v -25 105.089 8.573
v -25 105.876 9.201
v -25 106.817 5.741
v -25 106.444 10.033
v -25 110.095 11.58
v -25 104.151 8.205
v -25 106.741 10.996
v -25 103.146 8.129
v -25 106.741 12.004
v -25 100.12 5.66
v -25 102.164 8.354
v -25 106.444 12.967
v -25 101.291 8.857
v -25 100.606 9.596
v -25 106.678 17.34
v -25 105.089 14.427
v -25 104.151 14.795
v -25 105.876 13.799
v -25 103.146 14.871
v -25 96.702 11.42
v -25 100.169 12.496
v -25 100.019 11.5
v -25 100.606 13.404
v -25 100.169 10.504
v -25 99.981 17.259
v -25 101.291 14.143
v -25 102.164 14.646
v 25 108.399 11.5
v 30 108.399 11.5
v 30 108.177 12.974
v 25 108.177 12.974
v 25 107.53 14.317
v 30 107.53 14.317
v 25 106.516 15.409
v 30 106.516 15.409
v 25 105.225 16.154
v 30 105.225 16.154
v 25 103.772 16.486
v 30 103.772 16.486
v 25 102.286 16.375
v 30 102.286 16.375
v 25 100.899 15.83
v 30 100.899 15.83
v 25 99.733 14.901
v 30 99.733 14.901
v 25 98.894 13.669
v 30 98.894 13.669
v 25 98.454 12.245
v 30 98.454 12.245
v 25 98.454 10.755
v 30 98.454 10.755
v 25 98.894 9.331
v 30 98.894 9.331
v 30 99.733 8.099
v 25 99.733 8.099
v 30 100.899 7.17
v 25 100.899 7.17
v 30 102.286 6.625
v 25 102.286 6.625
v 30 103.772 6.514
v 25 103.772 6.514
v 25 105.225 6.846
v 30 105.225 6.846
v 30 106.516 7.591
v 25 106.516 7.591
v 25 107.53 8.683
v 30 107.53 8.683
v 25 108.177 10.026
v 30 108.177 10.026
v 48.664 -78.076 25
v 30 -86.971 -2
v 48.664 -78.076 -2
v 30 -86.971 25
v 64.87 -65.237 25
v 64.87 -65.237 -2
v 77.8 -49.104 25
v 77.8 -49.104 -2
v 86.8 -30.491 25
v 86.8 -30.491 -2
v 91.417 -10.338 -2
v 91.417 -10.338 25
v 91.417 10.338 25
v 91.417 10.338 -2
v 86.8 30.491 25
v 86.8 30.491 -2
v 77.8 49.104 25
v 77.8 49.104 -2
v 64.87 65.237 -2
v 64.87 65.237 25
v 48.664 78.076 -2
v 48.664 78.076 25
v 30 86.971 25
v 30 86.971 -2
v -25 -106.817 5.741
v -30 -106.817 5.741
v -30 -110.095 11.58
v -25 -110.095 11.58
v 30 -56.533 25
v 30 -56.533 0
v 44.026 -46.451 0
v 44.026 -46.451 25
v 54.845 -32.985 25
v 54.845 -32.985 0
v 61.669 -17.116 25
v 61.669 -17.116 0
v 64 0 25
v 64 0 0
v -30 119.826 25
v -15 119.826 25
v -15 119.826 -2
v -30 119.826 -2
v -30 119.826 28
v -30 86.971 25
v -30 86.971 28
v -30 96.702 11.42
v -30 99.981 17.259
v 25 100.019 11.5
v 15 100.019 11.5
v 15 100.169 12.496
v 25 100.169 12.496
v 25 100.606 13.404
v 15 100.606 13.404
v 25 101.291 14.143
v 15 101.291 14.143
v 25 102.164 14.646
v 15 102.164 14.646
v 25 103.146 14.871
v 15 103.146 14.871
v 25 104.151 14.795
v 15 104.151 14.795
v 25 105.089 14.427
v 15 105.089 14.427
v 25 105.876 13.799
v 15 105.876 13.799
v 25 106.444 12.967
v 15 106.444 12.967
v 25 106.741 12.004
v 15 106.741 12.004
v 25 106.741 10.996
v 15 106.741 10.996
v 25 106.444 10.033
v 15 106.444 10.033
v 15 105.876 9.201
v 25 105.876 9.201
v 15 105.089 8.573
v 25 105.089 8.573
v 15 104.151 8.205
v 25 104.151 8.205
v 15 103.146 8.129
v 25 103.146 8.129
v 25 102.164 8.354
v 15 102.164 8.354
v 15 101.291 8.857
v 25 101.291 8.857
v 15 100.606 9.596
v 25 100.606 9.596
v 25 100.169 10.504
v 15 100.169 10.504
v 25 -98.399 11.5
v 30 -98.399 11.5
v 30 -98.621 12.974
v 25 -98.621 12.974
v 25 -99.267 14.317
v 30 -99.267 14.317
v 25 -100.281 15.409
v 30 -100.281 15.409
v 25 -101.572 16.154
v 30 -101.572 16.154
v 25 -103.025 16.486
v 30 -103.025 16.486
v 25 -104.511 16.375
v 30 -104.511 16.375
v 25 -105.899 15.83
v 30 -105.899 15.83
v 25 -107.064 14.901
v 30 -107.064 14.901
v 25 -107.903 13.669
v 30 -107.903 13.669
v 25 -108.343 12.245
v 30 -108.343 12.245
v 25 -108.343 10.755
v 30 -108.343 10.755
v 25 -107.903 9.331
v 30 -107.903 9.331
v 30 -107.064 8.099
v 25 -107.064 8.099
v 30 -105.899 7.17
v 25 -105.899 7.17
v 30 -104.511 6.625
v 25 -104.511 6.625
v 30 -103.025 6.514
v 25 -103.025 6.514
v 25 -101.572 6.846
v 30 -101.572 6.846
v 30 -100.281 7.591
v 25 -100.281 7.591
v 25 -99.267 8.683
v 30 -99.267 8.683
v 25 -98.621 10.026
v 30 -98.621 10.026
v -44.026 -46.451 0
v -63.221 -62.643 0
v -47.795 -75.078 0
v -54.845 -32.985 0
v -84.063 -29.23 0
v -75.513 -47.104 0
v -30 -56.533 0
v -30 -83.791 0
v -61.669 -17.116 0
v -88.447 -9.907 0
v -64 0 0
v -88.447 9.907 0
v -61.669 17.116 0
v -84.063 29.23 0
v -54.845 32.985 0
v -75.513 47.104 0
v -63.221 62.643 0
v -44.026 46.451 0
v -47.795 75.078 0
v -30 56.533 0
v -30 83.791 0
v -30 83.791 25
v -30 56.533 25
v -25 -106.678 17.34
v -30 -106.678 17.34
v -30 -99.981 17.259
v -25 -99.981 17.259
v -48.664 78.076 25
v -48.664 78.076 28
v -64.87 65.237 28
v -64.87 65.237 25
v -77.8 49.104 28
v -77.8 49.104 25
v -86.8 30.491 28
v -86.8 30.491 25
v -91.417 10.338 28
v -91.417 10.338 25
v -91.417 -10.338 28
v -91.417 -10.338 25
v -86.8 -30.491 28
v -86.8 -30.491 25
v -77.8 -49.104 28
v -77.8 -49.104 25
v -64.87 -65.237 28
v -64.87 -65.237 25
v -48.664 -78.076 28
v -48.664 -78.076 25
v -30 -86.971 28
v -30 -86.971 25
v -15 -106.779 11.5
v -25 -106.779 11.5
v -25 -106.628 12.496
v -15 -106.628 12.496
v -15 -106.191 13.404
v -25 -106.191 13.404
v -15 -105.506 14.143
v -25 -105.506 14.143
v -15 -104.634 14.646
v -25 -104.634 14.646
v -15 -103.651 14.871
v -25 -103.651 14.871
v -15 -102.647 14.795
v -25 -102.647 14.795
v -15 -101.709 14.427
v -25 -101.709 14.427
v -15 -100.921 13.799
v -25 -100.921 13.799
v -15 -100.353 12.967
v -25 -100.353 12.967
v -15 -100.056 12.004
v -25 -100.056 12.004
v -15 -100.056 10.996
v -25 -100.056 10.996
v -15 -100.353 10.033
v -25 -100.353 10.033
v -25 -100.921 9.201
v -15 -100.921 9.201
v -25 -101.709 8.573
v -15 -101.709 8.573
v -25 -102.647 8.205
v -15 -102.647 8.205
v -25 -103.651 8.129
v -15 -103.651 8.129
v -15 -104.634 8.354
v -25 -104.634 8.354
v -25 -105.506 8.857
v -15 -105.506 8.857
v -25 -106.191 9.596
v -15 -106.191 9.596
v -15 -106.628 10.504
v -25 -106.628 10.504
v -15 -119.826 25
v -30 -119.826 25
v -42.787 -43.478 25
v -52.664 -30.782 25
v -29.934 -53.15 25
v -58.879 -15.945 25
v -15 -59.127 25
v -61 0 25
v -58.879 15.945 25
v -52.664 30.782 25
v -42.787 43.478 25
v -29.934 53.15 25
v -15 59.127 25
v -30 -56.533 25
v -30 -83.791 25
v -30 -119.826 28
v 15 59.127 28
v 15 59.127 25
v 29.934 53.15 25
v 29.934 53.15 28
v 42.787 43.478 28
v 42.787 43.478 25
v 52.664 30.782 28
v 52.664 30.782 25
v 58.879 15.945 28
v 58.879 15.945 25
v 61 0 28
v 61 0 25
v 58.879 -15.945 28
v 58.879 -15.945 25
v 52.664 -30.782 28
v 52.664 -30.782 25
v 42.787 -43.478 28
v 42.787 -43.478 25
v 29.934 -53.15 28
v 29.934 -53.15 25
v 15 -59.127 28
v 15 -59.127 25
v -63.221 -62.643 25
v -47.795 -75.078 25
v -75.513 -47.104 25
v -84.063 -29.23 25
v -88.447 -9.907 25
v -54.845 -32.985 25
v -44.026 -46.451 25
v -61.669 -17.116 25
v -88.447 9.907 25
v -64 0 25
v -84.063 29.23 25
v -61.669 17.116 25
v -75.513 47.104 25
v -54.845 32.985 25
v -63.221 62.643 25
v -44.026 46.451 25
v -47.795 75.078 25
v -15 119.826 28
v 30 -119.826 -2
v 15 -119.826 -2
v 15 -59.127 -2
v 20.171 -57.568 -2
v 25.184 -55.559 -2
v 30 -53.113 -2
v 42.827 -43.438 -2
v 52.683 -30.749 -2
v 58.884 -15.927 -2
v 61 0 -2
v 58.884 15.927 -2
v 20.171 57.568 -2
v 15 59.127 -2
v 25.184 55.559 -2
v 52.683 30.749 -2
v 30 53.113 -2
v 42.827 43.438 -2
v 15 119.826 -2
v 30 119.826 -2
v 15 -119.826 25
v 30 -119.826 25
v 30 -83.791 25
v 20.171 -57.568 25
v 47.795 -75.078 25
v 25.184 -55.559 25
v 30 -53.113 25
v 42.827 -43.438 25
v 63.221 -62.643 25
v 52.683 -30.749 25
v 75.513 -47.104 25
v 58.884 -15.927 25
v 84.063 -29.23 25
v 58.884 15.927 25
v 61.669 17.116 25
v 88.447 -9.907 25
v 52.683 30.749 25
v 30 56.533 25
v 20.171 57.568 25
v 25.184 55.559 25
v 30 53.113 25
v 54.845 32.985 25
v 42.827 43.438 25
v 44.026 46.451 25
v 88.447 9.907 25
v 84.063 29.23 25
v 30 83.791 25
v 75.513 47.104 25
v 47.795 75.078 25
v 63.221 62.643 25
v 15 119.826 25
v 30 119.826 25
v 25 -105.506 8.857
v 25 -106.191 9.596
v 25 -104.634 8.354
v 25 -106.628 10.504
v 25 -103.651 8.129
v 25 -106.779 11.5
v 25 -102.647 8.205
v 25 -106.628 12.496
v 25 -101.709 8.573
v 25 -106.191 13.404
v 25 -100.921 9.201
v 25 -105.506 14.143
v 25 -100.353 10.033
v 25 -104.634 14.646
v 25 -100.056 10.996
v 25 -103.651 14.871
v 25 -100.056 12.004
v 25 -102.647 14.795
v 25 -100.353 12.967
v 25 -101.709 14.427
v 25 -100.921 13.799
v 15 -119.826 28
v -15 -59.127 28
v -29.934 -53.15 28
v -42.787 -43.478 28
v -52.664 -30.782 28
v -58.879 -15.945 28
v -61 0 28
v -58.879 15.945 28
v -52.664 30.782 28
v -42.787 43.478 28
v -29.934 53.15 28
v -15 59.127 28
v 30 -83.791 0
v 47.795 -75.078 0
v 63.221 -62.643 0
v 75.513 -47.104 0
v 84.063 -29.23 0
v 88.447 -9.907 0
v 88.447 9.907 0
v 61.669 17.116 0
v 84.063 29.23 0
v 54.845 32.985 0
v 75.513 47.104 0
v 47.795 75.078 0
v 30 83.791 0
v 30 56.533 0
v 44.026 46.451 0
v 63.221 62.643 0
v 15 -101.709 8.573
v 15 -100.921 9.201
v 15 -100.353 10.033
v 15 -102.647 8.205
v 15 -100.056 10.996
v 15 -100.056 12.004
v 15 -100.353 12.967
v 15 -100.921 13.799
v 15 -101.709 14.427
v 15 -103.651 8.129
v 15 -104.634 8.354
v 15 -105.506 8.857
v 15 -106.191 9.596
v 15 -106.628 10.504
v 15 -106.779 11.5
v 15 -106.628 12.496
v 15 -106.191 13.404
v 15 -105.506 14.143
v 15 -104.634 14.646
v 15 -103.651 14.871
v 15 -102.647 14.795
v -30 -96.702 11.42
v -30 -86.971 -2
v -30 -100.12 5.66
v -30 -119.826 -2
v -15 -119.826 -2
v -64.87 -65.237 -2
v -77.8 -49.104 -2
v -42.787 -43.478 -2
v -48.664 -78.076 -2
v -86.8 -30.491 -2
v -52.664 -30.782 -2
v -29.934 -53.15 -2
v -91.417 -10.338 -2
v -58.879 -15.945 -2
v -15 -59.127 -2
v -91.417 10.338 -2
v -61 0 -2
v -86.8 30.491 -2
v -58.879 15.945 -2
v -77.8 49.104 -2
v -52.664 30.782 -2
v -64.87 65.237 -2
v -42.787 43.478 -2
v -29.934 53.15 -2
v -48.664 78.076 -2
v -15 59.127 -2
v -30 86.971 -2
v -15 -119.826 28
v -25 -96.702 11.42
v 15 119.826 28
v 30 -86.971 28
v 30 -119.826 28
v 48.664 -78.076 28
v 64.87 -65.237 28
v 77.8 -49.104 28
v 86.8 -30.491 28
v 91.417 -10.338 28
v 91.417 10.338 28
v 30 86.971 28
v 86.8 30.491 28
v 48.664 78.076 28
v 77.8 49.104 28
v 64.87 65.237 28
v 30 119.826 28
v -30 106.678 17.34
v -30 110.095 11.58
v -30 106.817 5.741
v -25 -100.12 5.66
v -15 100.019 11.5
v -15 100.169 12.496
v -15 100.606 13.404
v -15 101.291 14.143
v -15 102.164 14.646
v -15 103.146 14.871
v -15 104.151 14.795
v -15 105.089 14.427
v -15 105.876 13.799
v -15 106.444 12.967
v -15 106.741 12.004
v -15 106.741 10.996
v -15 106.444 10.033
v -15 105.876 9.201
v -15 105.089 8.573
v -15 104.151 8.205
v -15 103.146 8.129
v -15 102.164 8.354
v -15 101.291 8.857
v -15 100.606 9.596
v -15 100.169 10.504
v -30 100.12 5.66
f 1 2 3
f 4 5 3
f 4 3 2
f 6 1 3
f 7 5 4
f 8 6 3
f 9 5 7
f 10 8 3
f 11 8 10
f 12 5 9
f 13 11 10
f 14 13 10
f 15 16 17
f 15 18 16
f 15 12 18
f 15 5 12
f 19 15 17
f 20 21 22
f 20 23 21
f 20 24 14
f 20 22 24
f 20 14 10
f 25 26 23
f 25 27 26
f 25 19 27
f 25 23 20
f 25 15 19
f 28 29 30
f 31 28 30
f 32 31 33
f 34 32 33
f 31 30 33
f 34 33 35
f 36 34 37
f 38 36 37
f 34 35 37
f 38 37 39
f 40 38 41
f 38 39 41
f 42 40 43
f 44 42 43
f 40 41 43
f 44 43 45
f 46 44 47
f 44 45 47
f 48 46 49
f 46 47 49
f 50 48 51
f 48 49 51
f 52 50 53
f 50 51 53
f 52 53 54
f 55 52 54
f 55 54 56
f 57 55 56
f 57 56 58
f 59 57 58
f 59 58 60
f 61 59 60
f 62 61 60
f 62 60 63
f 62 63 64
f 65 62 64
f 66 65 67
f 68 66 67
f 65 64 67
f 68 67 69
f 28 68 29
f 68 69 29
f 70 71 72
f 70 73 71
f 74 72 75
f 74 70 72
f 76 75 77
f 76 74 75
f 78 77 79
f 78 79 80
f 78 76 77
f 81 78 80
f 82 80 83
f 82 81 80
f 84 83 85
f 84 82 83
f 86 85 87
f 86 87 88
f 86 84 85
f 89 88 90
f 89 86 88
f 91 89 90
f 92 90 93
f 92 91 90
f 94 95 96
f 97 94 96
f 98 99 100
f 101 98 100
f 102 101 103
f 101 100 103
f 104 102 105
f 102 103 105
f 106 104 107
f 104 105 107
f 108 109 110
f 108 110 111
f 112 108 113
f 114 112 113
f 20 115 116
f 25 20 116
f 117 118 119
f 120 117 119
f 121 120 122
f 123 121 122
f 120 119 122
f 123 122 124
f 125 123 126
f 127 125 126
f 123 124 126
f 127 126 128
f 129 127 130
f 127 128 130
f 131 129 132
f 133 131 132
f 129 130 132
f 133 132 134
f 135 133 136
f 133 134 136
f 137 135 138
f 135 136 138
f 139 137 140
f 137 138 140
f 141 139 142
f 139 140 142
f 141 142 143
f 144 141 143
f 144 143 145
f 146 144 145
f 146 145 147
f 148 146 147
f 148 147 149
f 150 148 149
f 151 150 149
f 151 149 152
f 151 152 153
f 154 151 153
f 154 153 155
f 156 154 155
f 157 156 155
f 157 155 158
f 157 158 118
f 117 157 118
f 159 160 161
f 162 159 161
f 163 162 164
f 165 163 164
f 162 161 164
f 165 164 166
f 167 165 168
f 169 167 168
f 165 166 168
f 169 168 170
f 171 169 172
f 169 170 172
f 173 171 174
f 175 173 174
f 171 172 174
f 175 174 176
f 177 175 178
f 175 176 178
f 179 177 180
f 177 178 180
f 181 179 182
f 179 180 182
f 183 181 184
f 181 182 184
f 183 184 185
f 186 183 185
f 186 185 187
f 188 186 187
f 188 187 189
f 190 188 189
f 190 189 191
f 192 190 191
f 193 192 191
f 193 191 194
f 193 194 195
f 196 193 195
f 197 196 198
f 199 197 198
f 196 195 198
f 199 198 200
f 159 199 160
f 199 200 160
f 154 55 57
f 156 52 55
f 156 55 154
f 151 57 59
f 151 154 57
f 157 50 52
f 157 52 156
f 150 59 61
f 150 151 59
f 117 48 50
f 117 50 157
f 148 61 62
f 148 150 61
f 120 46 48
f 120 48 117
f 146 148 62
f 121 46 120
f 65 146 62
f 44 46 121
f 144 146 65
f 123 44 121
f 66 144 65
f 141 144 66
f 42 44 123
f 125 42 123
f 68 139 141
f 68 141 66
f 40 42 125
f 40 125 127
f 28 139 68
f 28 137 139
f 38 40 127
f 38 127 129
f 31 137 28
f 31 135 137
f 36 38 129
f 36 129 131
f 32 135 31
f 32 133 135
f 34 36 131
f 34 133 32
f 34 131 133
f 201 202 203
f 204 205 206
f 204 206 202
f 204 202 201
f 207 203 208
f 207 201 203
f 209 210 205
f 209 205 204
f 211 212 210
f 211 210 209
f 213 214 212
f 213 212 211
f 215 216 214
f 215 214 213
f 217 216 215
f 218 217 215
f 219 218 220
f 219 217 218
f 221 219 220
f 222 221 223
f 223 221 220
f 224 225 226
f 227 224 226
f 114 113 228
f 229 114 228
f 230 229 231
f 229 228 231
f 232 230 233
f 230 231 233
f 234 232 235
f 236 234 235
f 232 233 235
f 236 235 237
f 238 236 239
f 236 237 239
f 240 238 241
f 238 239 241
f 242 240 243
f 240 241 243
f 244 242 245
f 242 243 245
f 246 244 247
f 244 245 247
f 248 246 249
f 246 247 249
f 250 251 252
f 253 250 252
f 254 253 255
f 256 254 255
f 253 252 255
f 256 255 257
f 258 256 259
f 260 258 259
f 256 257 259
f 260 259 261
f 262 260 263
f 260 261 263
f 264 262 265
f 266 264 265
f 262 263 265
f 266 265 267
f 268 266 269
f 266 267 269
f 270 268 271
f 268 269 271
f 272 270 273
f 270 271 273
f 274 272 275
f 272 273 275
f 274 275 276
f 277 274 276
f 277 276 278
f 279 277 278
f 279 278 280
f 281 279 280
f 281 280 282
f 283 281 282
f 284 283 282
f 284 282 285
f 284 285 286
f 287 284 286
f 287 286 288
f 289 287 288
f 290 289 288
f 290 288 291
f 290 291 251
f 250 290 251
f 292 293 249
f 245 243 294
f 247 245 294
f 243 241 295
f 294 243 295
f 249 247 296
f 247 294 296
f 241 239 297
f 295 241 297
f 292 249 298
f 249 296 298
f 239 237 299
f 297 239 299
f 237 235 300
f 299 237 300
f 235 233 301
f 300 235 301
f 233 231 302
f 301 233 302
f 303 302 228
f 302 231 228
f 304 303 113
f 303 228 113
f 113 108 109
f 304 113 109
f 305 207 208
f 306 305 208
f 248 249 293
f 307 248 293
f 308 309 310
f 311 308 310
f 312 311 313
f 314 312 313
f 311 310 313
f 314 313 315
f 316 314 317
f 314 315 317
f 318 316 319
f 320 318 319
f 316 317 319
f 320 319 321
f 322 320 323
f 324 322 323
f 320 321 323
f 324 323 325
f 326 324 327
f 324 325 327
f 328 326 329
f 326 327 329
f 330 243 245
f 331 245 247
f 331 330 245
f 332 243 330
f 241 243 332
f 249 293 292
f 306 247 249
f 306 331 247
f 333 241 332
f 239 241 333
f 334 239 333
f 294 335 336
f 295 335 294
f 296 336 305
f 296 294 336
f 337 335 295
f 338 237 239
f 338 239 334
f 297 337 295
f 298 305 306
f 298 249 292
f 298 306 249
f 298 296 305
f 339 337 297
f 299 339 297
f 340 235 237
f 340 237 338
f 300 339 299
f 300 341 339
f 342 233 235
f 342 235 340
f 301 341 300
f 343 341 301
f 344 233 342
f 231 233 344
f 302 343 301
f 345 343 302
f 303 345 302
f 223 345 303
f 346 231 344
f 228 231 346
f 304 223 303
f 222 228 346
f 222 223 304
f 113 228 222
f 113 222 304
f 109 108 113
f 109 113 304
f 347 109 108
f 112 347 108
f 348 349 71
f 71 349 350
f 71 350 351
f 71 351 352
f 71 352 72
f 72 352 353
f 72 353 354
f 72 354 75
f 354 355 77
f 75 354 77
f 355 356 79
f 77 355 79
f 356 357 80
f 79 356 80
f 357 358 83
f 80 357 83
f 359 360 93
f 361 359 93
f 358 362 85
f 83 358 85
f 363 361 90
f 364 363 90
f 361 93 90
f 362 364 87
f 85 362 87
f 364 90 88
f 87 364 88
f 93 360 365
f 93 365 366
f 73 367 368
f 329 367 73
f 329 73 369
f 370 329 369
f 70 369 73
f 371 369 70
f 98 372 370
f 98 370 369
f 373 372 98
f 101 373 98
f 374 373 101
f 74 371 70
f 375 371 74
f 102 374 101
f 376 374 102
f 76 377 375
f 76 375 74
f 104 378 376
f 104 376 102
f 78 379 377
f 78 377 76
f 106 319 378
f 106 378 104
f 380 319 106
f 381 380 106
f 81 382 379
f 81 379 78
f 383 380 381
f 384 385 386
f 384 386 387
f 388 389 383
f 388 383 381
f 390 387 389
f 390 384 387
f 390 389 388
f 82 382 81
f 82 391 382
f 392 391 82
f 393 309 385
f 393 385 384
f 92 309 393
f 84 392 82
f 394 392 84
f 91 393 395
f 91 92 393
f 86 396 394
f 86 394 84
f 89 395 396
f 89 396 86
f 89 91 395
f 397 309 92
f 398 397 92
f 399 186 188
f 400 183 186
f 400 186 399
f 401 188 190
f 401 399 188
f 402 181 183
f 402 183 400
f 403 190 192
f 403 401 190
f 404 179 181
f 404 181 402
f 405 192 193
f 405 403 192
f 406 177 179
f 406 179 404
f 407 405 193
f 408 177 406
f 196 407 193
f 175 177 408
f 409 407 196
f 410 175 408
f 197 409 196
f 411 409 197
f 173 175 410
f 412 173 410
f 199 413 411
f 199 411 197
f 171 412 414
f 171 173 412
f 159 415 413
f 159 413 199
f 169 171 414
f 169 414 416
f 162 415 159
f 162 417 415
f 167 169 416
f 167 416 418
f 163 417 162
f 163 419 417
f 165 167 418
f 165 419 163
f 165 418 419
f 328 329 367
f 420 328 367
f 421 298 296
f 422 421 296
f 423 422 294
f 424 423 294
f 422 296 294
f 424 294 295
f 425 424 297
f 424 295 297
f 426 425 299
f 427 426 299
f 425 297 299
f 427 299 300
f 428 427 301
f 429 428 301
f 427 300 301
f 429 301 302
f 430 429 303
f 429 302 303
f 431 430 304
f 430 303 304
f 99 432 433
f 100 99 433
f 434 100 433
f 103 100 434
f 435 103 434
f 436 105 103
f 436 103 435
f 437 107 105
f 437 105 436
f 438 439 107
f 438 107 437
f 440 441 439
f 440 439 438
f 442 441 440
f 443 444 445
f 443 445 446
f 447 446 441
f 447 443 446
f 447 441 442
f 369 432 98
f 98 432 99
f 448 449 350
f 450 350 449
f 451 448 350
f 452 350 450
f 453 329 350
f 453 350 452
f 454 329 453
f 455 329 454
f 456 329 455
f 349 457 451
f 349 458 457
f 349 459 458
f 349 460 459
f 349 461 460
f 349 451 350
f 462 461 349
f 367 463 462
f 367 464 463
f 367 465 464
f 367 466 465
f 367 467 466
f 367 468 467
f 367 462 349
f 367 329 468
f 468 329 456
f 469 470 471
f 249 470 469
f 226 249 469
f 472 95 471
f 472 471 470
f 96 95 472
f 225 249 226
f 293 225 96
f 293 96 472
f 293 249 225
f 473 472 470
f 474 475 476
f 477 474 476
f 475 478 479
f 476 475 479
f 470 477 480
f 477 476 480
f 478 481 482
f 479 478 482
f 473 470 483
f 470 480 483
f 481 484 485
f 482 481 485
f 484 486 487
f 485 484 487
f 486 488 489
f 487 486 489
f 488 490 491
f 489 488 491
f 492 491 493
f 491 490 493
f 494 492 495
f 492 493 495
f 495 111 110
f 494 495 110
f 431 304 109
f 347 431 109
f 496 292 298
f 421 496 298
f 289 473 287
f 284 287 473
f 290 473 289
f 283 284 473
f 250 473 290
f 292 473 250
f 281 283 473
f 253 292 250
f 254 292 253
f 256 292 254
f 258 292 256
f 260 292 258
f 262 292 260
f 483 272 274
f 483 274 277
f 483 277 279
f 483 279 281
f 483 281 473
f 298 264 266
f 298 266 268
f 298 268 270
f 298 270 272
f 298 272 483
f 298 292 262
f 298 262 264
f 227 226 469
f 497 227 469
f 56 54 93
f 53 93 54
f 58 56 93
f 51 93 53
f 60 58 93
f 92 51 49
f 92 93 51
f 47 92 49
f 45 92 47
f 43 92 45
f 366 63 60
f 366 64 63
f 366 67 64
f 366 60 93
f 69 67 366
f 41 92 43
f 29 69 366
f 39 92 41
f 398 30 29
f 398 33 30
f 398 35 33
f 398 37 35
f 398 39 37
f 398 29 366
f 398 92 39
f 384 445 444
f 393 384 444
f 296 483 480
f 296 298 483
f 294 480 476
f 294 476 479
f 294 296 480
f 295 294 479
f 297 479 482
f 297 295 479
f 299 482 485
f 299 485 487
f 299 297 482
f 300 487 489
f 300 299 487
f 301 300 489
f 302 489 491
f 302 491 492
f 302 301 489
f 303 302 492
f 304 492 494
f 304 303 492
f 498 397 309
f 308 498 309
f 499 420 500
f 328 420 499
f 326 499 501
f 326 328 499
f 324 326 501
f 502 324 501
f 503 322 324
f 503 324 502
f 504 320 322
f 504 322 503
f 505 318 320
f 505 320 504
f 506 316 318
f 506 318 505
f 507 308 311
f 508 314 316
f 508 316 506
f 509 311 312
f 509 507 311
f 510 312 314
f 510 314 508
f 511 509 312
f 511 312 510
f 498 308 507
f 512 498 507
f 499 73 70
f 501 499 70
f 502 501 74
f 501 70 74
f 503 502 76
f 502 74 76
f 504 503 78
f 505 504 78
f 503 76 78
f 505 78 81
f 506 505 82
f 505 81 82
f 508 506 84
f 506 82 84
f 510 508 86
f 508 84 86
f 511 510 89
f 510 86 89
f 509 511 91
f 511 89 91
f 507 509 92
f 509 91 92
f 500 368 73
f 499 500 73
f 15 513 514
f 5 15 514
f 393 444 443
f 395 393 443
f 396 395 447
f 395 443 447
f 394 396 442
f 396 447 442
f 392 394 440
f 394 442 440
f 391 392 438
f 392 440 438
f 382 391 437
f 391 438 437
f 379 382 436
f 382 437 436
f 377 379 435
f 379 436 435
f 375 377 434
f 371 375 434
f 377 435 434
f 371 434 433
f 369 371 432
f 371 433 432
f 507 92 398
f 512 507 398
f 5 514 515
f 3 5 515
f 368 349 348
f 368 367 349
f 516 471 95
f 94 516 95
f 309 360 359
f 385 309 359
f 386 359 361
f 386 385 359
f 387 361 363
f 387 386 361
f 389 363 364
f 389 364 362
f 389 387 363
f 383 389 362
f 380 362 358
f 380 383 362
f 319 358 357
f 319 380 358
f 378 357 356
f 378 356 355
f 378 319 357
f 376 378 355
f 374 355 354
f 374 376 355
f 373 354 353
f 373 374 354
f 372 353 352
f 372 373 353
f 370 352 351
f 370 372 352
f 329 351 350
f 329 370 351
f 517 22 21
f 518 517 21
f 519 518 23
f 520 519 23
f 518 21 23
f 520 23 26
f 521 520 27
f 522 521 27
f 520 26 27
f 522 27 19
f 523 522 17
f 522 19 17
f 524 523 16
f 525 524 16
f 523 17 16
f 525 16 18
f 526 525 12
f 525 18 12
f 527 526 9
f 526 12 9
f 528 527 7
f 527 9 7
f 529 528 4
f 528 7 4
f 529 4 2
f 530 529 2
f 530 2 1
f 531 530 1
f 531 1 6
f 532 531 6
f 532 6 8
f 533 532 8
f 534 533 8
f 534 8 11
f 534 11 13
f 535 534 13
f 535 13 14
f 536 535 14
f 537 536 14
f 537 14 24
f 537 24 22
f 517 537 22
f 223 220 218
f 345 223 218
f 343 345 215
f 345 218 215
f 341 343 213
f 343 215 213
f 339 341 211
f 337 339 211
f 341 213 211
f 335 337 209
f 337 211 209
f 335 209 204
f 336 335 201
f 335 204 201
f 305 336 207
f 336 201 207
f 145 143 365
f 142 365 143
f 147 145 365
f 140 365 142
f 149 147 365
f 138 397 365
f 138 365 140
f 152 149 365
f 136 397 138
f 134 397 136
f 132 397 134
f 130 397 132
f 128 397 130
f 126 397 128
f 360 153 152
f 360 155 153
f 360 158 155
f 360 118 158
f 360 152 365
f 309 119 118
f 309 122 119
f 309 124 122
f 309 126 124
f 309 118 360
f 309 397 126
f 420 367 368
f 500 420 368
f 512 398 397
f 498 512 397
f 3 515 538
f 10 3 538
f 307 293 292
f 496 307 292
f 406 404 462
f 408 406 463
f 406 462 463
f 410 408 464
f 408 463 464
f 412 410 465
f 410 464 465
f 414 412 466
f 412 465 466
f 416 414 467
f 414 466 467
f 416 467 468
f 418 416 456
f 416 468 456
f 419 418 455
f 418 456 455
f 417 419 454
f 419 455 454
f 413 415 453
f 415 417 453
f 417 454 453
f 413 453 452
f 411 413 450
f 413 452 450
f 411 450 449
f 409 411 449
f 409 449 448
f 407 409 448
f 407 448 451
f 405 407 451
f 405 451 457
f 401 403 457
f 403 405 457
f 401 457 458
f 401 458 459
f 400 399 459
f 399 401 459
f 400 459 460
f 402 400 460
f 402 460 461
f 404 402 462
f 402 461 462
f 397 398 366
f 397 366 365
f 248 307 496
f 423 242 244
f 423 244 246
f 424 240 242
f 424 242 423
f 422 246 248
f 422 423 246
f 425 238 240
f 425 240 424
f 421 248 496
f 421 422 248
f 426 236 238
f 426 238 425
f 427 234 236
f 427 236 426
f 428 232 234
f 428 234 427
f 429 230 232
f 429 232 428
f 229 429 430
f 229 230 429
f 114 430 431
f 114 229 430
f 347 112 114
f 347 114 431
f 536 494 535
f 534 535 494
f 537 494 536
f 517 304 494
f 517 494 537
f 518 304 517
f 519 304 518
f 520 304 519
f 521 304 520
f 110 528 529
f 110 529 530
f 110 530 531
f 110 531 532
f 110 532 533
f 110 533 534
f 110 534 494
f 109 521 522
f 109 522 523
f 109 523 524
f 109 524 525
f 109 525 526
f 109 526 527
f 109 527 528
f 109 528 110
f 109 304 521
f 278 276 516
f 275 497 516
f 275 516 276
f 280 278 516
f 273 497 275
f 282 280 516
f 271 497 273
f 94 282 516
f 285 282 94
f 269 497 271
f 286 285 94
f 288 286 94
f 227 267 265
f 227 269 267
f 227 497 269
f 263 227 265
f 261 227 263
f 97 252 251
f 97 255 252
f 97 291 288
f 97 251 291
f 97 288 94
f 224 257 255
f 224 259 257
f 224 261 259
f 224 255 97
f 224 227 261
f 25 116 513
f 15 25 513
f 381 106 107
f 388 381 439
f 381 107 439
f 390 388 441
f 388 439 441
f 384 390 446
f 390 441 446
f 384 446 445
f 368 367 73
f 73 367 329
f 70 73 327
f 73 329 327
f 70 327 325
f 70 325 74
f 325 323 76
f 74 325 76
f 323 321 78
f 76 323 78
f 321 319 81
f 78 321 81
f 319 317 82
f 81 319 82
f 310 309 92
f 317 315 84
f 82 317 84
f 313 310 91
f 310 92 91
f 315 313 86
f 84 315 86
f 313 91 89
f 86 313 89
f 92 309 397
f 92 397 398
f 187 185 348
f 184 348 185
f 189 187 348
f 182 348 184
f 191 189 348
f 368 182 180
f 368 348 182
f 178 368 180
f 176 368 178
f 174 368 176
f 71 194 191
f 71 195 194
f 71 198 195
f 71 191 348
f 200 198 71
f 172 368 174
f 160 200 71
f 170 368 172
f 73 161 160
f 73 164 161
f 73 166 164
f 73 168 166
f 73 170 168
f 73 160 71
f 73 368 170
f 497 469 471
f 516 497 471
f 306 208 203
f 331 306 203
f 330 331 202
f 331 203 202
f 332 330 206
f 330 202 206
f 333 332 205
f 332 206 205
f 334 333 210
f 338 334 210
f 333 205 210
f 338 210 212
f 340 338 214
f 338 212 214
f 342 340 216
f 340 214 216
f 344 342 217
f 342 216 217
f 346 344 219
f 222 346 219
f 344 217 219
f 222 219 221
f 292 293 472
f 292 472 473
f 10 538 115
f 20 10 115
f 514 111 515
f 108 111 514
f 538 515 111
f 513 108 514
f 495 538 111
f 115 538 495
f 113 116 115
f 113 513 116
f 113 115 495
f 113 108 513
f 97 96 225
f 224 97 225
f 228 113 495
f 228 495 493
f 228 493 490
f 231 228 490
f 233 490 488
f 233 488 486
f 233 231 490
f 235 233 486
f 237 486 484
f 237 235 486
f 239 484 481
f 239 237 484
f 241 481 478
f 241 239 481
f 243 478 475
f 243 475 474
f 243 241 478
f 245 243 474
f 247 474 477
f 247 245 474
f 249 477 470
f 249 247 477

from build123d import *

# Parameters (mm, degrees)
F1_DEPTH      = 2
F2_DEPTH      = 25
F2_DEPTH_BACK = 2
F4_R          = 3.38
F5_DEPTH      = 122.001
F7_DEPTH      = 5
F9_DEPTH      = 3
F6_R          = 5
F6_R_2        = 3.38
F10_DEPTH     = 5


with BuildPart() as f1:
    # F0 (on Top) → F1 (new body)
    with BuildSketch(Plane.XY):
        with BuildLine():
            ThreePointArc((-30, -56.5331761004), (-64, 0), (-30, 56.5331761004))
            Line((-30, 56.5331761004), (-30, 83.7914076741))
            ThreePointArc((-30, 83.7914076741), (-89, 0), (-30, -83.7914076741))
            Line((-30, -83.7914076741), (-30, -56.5331761004))
        make_face()
    extrude(amount=-F1_DEPTH)

    # F0 (on Top) → F2 (join, two sides)
    with BuildSketch(Plane.XY) as f2_sk:
        with BuildLine():
            ThreePointArc((-30, -53.1130868996), (-61, 0), (-30, 53.1130868996))
            Line((-30, 53.1130868996), (-30, 56.5331761004))
            ThreePointArc((-30, 56.5331761004), (-64, 0), (-30, -56.5331761004))
            Line((-30, -56.5331761004), (-30, -53.1130868996))
        make_face()
        with BuildLine():
            ThreePointArc((-30, 53.1130868996), (-22.7000381841, 56.6189744383), (-15, 59.1269819964))
            Line((-15, 59.1269819964), (-15, 62.2173609212))
            ThreePointArc((-15, 62.2173609212), (-22.6787894137, 59.8470760416), (-30, 56.5331761004))
            Line((-30, 56.5331761004), (-30, 53.1130868996))
        make_face()
        with BuildLine():
            Line((-15, -87.7268487978), (-15, -62.2173609212))
            ThreePointArc((-15, -62.2173609212), (-22.6787894137, -59.8470760416), (-30, -56.5331761004))
            Line((-30, -56.5331761004), (-30, -83.7914076741))
            ThreePointArc((-30, -83.7914076741), (-22.5858788673, -86.0864569824), (-15, -87.7268487978))
        make_face()
        with BuildLine():
            Line((-15, -62.2173609212), (-15, -59.1269819964))
            ThreePointArc((-15, -59.1269819964), (-22.7000381841, -56.6189744383), (-30, -53.1130868996))
            Line((-30, -53.1130868996), (-30, -56.5331761004))
            ThreePointArc((-30, -56.5331761004), (-22.6787894137, -59.8470760416), (-15, -62.2173609212))
        make_face()
        with BuildLine():
            Line((-15, -90.768937418), (-15, -87.7268487978))
            ThreePointArc((-15, -87.7268487978), (-22.5858788673, -86.0864569824), (-30, -83.7914076741))
            Line((-30, -83.7914076741), (-30, -86.9712596206))
            ThreePointArc((-30, -86.9712596206), (-22.5799820452, -89.1860101744), (-15, -90.768937418))
        make_face()
        with BuildLine():
            Line((-15, -119.826041162), (-15, -90.768937418))
            ThreePointArc((-15, -90.768937418), (-22.5799820452, -89.1860101744), (-30, -86.9712596206))
            Line((-30, -86.9712596206), (-30, -119.826041162))
            Line((-30, -119.826041162), (-15, -119.826041162))
        make_face()
        with BuildLine():
            ThreePointArc((-30, -83.7914076741), (-89, 0), (-30, 83.7914076741))
            Line((-30, 83.7914076741), (-30, 86.9712596206))
            ThreePointArc((-30, 86.9712596206), (-92, 0), (-30, -86.9712596206))
            Line((-30, -86.9712596206), (-30, -83.7914076741))
        make_face()
        with BuildLine():
            ThreePointArc((-30, 56.5331761004), (-22.6787894137, 59.8470760416), (-15, 62.2173609212))
            Line((-15, 62.2173609212), (-15, 87.7268487978))
            ThreePointArc((-15, 87.7268487978), (-22.5858788673, 86.0864569824), (-30, 83.7914076741))
            Line((-30, 83.7914076741), (-30, 56.5331761004))
        make_face()
        with BuildLine():
            ThreePointArc((-30, 83.7914076741), (-22.5858788673, 86.0864569824), (-15, 87.7268487978))
            Line((-15, 87.7268487978), (-15, 90.768937418))
            ThreePointArc((-15, 90.768937418), (-22.5799820452, 89.1860101744), (-30, 86.9712596206))
            Line((-30, 86.9712596206), (-30, 83.7914076741))
        make_face()
        with BuildLine():
            ThreePointArc((-30, 86.9712596206), (-22.5799820452, 89.1860101744), (-15, 90.768937418))
            Line((-15, 90.768937418), (-15, 119.826041162))
            Line((-15, 119.826041162), (-30, 119.826041162))
            Line((-30, 119.826041162), (-30, 86.9712596206))
        make_face()
    extrude(amount=F2_DEPTH)
    extrude(f2_sk.sketch, amount=-F2_DEPTH_BACK)


with BuildPart() as f1b:
    # F0 (on Top) → F1, piece 2 (new body)
    with BuildSketch(Plane.XY):
        with BuildLine():
            Line((30, 83.7914076741), (30, 56.5331761004))
            ThreePointArc((30, 56.5331761004), (54.8452368032, 32.9848450049), (64, 0))
            ThreePointArc((64, 0), (54.8452368032, -32.9848450049), (30, -56.5331761004))
            Line((30, -56.5331761004), (30, -83.7914076741))
            ThreePointArc((30, -83.7914076741), (72.7701862029, -51.2396330978), (89, 0))
            ThreePointArc((89, 0), (72.7701862029, 51.2396330978), (30, 83.7914076741))
        make_face()
    extrude(amount=-F1_DEPTH)

    # F0 (on Top) → F2, piece 2 (join, two sides)
    with BuildSketch(Plane.XY) as f2_2_sk:
        with BuildLine():
            ThreePointArc((15, 59.1269819964), (22.7000381841, 56.6189744383), (30, 53.1130868996))
            Line((30, 53.1130868996), (30, 56.5331761004))
            ThreePointArc((30, 56.5331761004), (22.6787894137, 59.8470760416), (15, 62.2173609212))
            Line((15, 62.2173609212), (15, 59.1269819964))
        make_face()
        with BuildLine():
            ThreePointArc((30, 53.1130868996), (52.6830143405, 30.748983723), (61, 0))
            ThreePointArc((61, 0), (52.6830143405, -30.748983723), (30, -53.1130868996))
            Line((30, -53.1130868996), (30, -56.5331761004))
            ThreePointArc((30, -56.5331761004), (54.8452368032, -32.9848450049), (64, 0))
            ThreePointArc((64, 0), (54.8452368032, 32.9848450049), (30, 56.5331761004))
            Line((30, 56.5331761004), (30, 53.1130868996))
        make_face()
        with BuildLine():
            Line((30, -83.7914076741), (30, -56.5331761004))
            ThreePointArc((30, -56.5331761004), (22.6787894137, -59.8470760416), (15, -62.2173609212))
            Line((15, -62.2173609212), (15, -87.7268487978))
            ThreePointArc((15, -87.7268487978), (22.5858788673, -86.0864569824), (30, -83.7914076741))
        make_face()
        with BuildLine():
            Line((30, -56.5331761004), (30, -53.1130868996))
            ThreePointArc((30, -53.1130868996), (22.7000381841, -56.6189744383), (15, -59.1269819964))
            Line((15, -59.1269819964), (15, -62.2173609212))
            ThreePointArc((15, -62.2173609212), (22.6787894137, -59.8470760416), (30, -56.5331761004))
        make_face()
        with BuildLine():
            Line((30, -86.9712596206), (30, -83.7914076741))
            ThreePointArc((30, -83.7914076741), (22.5858788673, -86.0864569824), (15, -87.7268487978))
            Line((15, -87.7268487978), (15, -90.768937418))
            ThreePointArc((15, -90.768937418), (22.5799820452, -89.1860101744), (30, -86.9712596206))
        make_face()
        with BuildLine():
            Line((30, 86.9712596206), (30, 83.7914076741))
            ThreePointArc((30, 83.7914076741), (72.7701862029, 51.2396330978), (89, 0))
            ThreePointArc((89, 0), (72.7701862029, -51.2396330978), (30, -83.7914076741))
            Line((30, -83.7914076741), (30, -86.9712596206))
            ThreePointArc((30, -86.9712596206), (74.9132832013, -53.4041196913), (92, 0))
            ThreePointArc((92, 0), (74.9132832013, 53.4041196913), (30, 86.9712596206))
        make_face()
        with BuildLine():
            Line((30, -119.826041162), (30, -86.9712596206))
            ThreePointArc((30, -86.9712596206), (22.5799820452, -89.1860101744), (15, -90.768937418))
            Line((15, -90.768937418), (15, -119.826041162))
            Line((15, -119.826041162), (30, -119.826041162))
        make_face()
        with BuildLine():
            ThreePointArc((15, 62.2173609212), (22.6787894137, 59.8470760416), (30, 56.5331761004))
            Line((30, 56.5331761004), (30, 83.7914076741))
            ThreePointArc((30, 83.7914076741), (22.5858788673, 86.0864569824), (15, 87.7268487978))
            Line((15, 87.7268487978), (15, 62.2173609212))
        make_face()
        with BuildLine():
            ThreePointArc((15, 90.768937418), (22.5799820452, 89.1860101744), (30, 86.9712596206))
            Line((30, 86.9712596206), (30, 119.826041162))
            Line((30, 119.826041162), (15, 119.826041162))
            Line((15, 119.826041162), (15, 90.768937418))
        make_face()
        with BuildLine():
            ThreePointArc((15, 87.7268487978), (22.5858788673, 86.0864569824), (30, 83.7914076741))
            Line((30, 83.7914076741), (30, 86.9712596206))
            ThreePointArc((30, 86.9712596206), (22.5799820452, 89.1860101744), (15, 90.768937418))
            Line((15, 90.768937418), (15, 87.7268487978))
        make_face()
    extrude(amount=F2_DEPTH)
    extrude(f2_2_sk.sketch, amount=-F2_DEPTH_BACK)


with BuildPart() as f5_tool:
    # F4 (on face) → F5 (new body, through all)
    with BuildSketch(Plane(origin=(-30, 0, 0), x_dir=(0, -1, 0), z_dir=(-1, 0, 0))):
        with Locations((-103.3986503913, 11.5)):
            Circle(F4_R)
        with Locations((103.3986503913, 11.5)):
            Circle(F4_R)
    extrude(amount=-F5_DEPTH)


with BuildPart() as f1_1:
    add(f1.part)

    # F5: cut by f5_tool
    add(f5_tool.part, mode=Mode.SUBTRACT)

    # F4 (on face) → F7 (cut)
    with BuildSketch(Plane(origin=(-30, 0, 0), x_dir=(0, -1, 0), z_dir=(-1, 0, 0))):
        Polygon((-96.701868562, 11.4197101238), (-99.9807264042, 17.2594382497), (-106.6775082335, 17.3397281259), (-110.0954322206, 11.5802898762), (-106.8165743784, 5.7405617503), (-100.1197925491, 5.6602718741), align=None)
        with Locations((-103.3986503913, 11.5)):
            Circle(F4_R, mode=Mode.SUBTRACT)
        Polygon((106.6775082335, 17.3397281259), (99.9807264042, 17.2594382497), (96.701868562, 11.4197101238), (100.1197925491, 5.6602718741), (106.8165743784, 5.7405617503), (110.0954322206, 11.5802898762), align=None)
        with Locations((103.3986503913, 11.5)):
            Circle(F4_R, mode=Mode.SUBTRACT)
    extrude(amount=-F7_DEPTH, mode=Mode.SUBTRACT)


with BuildPart() as f1b_1:
    add(f1b.part)

    # F5: cut by f5_tool
    add(f5_tool.part, mode=Mode.SUBTRACT)

    # F6 (on face) → F10 (cut)
    with BuildSketch(Plane.YZ.offset(30)):
        with Locations((-103.3986503913, 11.5)):
            Circle(F6_R)
        with Locations((-103.3986503913, 11.5)):
            Circle(F6_R_2, mode=Mode.SUBTRACT)
        with Locations((103.3986503913, 11.5)):
            Circle(F6_R)
    extrude(amount=-F10_DEPTH, mode=Mode.SUBTRACT)


with BuildPart() as f9:
    # F8 (on face) → F9 (new body)
    with BuildSketch(Plane.XY.offset(25)):
        with BuildLine():
            Line((-15, 59.1269819964), (-15, 119.826041162))
            Line((-15, 119.826041162), (-30, 119.826041162))
            Line((-30, 119.826041162), (-30, 86.9712596206))
            ThreePointArc((-30, 86.9712596206), (-92, 0), (-30, -86.9712596206))
            Line((-30, -86.9712596206), (-30, -119.826041162))
            Line((-30, -119.826041162), (-15, -119.826041162))
            Line((-15, -119.826041162), (-15, -59.1269819964))
            ThreePointArc((-15, -59.1269819964), (-61, 0), (-15, 59.1269819964))
        make_face()
        with BuildLine():
            Line((-30, -56.5331761004), (-30, -83.7914076741))
            ThreePointArc((-30, -83.7914076741), (-89, 0), (-30, 83.7914076741))
            Line((-30, 83.7914076741), (-30, 56.5331761004))
            ThreePointArc((-30, 56.5331761004), (-64, 0), (-30, -56.5331761004))
        make_face(mode=Mode.SUBTRACT)
        with BuildLine():
            ThreePointArc((-30, 83.7914076741), (-89, 0), (-30, -83.7914076741))
            Line((-30, -83.7914076741), (-30, -56.5331761004))
            ThreePointArc((-30, -56.5331761004), (-64, 0), (-30, 56.5331761004))
            Line((-30, 56.5331761004), (-30, 83.7914076741))
        make_face()
    extrude(amount=F9_DEPTH)


with BuildPart() as f9b:
    # F8 (on face) → F9, piece 2 (new body)
    with BuildSketch(Plane.XY.offset(25)):
        with BuildLine():
            Line((30, 86.9712596206), (30, 119.826041162))
            Line((30, 119.826041162), (15, 119.826041162))
            Line((15, 119.826041162), (15, 59.1269819964))
            ThreePointArc((15, 59.1269819964), (61, 0), (15, -59.1269819964))
            Line((15, -59.1269819964), (15, -119.826041162))
            Line((15, -119.826041162), (30, -119.826041162))
            Line((30, -119.826041162), (30, -86.9712596206))
            ThreePointArc((30, -86.9712596206), (92, 0), (30, 86.9712596206))
        make_face()
    extrude(amount=F9_DEPTH)


solid = Compound([f1_1.part, f1b_1.part, f9.part, f9b.part])
